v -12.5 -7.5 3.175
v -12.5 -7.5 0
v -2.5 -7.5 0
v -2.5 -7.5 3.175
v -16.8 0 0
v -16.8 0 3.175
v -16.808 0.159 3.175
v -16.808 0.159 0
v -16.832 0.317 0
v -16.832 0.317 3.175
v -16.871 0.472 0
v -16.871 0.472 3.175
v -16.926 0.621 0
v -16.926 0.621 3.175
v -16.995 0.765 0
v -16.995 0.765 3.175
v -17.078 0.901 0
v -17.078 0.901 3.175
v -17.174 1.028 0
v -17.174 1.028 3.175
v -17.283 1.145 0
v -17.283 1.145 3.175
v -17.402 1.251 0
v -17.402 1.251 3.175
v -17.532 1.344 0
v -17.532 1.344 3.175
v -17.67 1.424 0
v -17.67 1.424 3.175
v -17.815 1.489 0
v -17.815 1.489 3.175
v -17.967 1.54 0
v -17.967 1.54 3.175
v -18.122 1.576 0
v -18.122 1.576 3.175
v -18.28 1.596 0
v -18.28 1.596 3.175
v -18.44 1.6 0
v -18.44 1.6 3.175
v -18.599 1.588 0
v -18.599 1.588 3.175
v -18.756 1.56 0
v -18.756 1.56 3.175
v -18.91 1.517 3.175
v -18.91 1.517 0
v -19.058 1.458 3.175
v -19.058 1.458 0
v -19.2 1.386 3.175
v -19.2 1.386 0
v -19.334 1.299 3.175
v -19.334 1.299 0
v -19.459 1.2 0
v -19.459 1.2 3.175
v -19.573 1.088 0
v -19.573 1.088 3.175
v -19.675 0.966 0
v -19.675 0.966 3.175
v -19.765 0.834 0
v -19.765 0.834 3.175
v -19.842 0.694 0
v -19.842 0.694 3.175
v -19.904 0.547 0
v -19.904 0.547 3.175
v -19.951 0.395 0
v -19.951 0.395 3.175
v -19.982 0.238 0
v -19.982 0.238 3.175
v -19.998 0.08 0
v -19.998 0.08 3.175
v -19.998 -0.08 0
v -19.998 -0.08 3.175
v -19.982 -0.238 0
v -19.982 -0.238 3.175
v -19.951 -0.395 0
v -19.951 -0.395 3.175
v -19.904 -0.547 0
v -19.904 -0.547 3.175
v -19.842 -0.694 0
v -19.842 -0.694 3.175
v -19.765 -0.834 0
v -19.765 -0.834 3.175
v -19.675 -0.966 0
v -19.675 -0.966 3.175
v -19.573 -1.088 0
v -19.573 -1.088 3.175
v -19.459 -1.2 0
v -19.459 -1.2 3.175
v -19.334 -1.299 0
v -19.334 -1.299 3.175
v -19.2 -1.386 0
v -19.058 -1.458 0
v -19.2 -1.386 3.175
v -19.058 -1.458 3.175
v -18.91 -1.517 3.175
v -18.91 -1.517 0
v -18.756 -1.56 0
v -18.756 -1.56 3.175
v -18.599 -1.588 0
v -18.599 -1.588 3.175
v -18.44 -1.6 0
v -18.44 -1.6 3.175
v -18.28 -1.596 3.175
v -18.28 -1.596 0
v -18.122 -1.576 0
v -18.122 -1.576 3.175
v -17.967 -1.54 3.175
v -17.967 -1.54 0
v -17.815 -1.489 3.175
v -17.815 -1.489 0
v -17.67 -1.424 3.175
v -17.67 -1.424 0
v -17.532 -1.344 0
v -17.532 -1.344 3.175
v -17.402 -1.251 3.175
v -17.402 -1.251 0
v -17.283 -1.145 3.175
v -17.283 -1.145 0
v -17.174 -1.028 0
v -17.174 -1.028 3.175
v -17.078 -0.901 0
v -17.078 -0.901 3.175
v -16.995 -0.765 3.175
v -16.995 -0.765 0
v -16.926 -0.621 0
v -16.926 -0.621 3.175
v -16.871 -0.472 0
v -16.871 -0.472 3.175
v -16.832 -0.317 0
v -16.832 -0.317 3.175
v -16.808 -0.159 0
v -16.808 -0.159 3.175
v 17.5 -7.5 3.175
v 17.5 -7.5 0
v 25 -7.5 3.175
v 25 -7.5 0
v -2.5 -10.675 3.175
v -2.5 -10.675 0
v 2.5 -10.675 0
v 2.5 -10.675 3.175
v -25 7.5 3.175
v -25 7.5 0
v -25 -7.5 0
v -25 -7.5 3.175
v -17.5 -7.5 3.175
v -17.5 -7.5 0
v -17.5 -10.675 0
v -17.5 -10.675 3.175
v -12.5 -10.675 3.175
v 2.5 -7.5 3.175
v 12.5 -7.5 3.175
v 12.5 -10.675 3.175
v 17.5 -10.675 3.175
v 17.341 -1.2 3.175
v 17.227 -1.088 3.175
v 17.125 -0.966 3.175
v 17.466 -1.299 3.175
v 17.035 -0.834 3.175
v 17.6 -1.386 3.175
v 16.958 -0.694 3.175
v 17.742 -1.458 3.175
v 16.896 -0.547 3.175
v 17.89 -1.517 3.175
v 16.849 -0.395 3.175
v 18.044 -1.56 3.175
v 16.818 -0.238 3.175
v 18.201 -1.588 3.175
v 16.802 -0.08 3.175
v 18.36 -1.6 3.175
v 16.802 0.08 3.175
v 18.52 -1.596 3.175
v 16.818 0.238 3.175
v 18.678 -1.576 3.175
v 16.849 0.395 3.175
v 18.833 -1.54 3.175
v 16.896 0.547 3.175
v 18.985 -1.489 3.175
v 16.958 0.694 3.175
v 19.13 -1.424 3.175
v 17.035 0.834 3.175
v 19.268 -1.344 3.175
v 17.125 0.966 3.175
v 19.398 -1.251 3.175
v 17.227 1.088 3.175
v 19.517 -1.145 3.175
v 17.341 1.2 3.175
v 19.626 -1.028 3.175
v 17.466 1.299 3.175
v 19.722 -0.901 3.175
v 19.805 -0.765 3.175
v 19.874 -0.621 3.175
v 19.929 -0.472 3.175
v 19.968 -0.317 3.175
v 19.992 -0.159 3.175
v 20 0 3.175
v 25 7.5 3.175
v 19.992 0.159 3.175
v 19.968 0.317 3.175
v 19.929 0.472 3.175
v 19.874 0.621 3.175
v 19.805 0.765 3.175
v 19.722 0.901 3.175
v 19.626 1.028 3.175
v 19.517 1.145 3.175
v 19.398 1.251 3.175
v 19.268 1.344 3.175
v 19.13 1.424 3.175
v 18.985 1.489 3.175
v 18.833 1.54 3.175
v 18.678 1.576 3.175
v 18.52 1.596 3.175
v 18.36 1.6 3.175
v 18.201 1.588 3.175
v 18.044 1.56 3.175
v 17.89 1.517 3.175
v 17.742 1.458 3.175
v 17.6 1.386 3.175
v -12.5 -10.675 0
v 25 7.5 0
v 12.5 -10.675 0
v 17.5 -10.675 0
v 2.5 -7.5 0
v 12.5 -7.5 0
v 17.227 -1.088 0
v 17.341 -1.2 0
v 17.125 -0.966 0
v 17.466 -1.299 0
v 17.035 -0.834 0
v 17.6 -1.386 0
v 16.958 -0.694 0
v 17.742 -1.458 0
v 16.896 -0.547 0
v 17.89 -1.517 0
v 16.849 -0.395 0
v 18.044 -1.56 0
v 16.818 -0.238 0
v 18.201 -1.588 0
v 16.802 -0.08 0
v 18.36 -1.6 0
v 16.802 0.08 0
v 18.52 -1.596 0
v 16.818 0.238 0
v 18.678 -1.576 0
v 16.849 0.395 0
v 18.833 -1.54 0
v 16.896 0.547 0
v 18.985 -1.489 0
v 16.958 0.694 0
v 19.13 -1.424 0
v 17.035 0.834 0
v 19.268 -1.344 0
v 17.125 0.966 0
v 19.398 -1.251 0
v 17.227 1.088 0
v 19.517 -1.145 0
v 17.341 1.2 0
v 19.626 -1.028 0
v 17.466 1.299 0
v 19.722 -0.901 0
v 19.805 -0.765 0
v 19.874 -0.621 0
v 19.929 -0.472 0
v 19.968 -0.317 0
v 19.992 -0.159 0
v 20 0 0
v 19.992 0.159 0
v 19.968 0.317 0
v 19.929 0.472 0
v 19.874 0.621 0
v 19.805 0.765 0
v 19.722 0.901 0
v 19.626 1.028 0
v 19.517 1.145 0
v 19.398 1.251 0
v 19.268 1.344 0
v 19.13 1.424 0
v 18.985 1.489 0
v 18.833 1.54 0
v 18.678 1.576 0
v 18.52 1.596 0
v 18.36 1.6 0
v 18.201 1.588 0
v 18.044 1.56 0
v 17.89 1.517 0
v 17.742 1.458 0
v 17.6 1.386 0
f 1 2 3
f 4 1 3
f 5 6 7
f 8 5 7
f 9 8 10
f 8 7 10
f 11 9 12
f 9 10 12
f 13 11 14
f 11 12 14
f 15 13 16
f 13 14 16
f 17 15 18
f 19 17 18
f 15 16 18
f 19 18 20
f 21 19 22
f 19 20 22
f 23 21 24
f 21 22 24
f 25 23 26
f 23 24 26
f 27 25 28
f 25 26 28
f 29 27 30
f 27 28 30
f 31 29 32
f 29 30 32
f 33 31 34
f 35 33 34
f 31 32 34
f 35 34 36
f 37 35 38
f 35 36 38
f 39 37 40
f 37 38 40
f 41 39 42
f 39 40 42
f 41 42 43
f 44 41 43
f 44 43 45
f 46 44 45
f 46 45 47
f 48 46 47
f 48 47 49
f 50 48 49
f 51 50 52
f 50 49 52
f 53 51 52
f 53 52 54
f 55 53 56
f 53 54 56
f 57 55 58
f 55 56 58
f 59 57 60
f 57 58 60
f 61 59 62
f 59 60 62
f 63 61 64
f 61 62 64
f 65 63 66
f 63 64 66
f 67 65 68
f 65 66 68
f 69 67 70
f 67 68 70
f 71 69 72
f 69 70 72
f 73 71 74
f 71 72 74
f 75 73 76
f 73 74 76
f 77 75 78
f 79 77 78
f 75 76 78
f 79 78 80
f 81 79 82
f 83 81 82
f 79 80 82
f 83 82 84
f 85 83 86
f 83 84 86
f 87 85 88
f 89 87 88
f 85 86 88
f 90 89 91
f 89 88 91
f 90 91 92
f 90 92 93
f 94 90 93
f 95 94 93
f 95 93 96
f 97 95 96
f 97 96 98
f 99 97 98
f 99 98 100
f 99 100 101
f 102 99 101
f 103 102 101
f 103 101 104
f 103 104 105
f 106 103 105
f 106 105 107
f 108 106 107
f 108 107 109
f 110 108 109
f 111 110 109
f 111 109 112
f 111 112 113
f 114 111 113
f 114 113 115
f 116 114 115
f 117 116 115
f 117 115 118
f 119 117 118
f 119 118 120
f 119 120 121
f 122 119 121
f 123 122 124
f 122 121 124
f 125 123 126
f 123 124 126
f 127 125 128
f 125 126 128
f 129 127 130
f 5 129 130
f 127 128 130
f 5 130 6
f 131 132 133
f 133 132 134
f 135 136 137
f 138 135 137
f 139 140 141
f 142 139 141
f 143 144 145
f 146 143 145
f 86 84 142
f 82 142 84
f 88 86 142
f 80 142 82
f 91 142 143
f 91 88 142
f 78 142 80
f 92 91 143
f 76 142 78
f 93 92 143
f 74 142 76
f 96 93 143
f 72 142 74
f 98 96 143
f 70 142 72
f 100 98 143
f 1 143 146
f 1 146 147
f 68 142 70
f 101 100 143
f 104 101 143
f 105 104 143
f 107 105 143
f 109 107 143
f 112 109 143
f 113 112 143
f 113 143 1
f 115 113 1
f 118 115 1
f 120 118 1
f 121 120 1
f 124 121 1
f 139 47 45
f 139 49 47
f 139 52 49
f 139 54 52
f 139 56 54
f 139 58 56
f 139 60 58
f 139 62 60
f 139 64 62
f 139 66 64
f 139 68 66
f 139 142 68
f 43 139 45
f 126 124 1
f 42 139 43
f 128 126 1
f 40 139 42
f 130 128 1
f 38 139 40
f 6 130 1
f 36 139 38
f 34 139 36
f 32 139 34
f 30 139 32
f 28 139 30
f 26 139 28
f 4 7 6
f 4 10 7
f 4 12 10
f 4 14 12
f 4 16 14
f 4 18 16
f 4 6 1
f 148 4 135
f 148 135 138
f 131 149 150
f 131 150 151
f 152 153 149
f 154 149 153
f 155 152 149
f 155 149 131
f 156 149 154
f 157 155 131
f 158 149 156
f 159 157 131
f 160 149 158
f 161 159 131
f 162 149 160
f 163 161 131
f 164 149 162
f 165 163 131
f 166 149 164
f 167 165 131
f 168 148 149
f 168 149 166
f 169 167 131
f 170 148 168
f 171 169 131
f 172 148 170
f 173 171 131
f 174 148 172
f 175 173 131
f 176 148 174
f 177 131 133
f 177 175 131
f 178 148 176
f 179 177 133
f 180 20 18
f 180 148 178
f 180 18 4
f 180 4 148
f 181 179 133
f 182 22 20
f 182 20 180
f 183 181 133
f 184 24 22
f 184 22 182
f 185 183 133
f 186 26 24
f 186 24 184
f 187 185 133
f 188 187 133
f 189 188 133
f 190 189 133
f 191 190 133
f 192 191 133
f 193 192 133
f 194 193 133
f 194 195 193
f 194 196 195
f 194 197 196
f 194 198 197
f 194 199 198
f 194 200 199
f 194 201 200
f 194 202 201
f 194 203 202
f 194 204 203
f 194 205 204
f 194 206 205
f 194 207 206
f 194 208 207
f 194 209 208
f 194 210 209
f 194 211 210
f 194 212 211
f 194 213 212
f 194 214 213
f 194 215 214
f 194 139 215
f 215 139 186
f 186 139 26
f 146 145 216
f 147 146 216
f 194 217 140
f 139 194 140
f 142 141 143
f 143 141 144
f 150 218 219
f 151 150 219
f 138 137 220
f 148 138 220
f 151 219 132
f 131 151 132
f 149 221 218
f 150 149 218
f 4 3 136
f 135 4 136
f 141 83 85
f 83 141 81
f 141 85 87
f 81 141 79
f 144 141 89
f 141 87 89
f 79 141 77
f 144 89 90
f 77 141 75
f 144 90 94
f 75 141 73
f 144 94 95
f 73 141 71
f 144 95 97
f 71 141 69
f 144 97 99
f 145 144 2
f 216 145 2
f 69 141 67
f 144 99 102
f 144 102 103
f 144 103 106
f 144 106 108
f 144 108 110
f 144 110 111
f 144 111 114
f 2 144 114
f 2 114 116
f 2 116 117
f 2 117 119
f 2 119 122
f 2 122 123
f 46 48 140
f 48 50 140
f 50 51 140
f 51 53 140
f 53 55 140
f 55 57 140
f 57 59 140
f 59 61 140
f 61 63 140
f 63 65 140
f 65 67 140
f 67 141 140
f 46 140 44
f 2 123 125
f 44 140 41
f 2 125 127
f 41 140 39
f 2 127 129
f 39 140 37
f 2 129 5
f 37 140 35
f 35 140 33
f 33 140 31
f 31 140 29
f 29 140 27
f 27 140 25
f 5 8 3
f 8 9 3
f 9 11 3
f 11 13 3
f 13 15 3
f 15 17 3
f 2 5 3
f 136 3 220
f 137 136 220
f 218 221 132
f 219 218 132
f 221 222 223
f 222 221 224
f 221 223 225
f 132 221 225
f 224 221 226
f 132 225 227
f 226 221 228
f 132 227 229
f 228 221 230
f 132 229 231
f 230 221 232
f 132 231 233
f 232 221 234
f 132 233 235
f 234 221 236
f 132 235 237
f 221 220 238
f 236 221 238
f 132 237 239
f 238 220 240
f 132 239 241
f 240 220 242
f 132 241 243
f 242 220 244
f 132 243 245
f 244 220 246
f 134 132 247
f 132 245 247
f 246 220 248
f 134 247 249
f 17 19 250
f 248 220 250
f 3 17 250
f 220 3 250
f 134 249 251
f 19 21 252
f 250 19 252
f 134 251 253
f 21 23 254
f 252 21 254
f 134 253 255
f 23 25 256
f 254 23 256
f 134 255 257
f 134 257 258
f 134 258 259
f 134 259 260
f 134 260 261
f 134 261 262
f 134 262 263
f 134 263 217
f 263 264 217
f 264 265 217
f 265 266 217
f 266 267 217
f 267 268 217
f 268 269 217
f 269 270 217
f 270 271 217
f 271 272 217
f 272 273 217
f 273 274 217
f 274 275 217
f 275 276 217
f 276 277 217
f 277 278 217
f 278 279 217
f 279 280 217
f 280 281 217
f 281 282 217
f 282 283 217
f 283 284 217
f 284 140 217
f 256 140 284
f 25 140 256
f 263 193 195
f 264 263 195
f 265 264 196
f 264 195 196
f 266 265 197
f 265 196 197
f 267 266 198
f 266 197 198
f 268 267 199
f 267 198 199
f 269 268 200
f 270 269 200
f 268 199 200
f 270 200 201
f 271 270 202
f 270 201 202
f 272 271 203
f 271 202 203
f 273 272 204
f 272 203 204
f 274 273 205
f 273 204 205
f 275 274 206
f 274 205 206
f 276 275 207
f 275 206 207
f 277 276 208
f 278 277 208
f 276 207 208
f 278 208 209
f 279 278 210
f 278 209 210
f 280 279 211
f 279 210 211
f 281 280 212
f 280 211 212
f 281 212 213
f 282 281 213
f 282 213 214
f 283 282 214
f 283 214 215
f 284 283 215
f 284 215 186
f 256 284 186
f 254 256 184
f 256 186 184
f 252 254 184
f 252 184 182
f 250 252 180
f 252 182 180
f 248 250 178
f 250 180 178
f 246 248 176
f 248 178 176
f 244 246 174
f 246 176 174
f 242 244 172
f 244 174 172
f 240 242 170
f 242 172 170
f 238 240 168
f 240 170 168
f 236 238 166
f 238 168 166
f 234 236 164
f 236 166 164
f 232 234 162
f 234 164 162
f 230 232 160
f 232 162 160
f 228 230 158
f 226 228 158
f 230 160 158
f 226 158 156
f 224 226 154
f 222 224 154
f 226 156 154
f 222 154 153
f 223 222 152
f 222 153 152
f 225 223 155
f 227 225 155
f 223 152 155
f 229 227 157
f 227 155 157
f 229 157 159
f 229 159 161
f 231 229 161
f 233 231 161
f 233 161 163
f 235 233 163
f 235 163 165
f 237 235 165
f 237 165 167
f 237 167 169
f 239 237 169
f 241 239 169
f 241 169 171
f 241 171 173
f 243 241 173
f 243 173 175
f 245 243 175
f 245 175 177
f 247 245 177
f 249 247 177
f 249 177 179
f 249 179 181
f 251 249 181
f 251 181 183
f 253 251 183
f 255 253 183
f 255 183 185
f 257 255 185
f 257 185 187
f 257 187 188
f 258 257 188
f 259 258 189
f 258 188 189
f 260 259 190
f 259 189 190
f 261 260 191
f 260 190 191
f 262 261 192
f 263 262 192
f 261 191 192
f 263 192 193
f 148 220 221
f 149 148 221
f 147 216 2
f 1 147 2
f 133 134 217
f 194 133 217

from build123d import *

# Parameters (mm, degrees)
BOSS_EXTRUDE1_DEPTH = 3.175
SKETCH2_R           = 1.6
CUT_EXTRUDE1_DEPTH  = 3.175


with BuildPart() as part:
    # Sketch1 → Boss-Extrude1 (new body)
    with BuildSketch(Plane.XY):
        Polygon((25, 7.5), (-25, 7.5), (-25, -7.5), (-17.5, -7.5), (-17.5, -10.675), (-12.5, -10.675), (-12.5, -7.5), (-2.5, -7.5), (-2.5, -10.675), (2.5, -10.675), (2.5, -7.5), (12.5, -7.5), (12.5, -10.675), (17.5, -10.675), (17.5, -7.5), (25, -7.5), align=None)
    extrude(amount=BOSS_EXTRUDE1_DEPTH)

    # Sketch2 → Cut-Extrude1 (cut)
    with BuildSketch(Plane.XY.offset(3.175)):
        with Locations((-18.4, 0)):
            Circle(SKETCH2_R)
        with Locations((18.4, 0)):
            Circle(SKETCH2_R)
    extrude(amount=-CUT_EXTRUDE1_DEPTH, mode=Mode.SUBTRACT)


solid = part.part
